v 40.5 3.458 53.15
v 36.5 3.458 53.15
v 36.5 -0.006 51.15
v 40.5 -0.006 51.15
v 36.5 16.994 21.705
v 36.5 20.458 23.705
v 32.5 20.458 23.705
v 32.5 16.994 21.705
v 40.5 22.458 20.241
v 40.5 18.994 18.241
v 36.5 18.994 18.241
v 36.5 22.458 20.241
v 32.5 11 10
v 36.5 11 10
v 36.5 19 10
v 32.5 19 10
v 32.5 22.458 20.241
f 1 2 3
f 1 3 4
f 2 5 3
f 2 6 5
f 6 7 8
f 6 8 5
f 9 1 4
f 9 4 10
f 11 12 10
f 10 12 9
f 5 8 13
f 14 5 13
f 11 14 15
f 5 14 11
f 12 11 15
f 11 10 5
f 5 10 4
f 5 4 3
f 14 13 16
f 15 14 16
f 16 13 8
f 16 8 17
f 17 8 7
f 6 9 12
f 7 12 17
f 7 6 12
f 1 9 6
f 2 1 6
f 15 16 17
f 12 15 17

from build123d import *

# Parameters (mm, degrees)
EXTRUDE025_DEPTH                          = 4
EXTRUDE024_DEPTH                          = 4
EXTRUDE024_ONTO_SKETCH023_PLACEMENT_ANGLE = 120


with BuildPart() as extrude025:
    # Sketch024 (on Face7 of Extrude024) → Extrude025 (new body)
    with BuildSketch(Plane(origin=(32.5, 0, 0), x_dir=(0, -1, 0), z_dir=(-1, 0, 0))):
        Polygon((-19, 10), (-22.458142, 20.240827), (-16.99404, 21.704929), (-11, 10), align=None)
    extrude(amount=-EXTRUDE025_DEPTH)


with BuildPart() as pin_reset:
    # Sketch023 as drawn → Extrude024 (new)
    with BuildSketch(Plane.XY):
        Polygon((32.5, 10.3), (36.5, 10.3), (36.5, 44.3), (40.5, 44.3), (40.5, 6.3), (36.5, 6.3), (32.5, 6.3), align=None)
    extrude(amount=EXTRUDE024_DEPTH)


with BuildPart() as pin_reset_1:
    # Extrude024 onto Sketch023 placement: moved
    add(pin_reset.part.moved(Location((0, 25.608142, 14.784867))).rotate(Axis((0, 25.608142, 14.784867), (1, 0, 0)), EXTRUDE024_ONTO_SKETCH023_PLACEMENT_ANGLE))

    # Connect006: union Extrude025
    add(extrude025.part)


solid = pin_reset_1.part
